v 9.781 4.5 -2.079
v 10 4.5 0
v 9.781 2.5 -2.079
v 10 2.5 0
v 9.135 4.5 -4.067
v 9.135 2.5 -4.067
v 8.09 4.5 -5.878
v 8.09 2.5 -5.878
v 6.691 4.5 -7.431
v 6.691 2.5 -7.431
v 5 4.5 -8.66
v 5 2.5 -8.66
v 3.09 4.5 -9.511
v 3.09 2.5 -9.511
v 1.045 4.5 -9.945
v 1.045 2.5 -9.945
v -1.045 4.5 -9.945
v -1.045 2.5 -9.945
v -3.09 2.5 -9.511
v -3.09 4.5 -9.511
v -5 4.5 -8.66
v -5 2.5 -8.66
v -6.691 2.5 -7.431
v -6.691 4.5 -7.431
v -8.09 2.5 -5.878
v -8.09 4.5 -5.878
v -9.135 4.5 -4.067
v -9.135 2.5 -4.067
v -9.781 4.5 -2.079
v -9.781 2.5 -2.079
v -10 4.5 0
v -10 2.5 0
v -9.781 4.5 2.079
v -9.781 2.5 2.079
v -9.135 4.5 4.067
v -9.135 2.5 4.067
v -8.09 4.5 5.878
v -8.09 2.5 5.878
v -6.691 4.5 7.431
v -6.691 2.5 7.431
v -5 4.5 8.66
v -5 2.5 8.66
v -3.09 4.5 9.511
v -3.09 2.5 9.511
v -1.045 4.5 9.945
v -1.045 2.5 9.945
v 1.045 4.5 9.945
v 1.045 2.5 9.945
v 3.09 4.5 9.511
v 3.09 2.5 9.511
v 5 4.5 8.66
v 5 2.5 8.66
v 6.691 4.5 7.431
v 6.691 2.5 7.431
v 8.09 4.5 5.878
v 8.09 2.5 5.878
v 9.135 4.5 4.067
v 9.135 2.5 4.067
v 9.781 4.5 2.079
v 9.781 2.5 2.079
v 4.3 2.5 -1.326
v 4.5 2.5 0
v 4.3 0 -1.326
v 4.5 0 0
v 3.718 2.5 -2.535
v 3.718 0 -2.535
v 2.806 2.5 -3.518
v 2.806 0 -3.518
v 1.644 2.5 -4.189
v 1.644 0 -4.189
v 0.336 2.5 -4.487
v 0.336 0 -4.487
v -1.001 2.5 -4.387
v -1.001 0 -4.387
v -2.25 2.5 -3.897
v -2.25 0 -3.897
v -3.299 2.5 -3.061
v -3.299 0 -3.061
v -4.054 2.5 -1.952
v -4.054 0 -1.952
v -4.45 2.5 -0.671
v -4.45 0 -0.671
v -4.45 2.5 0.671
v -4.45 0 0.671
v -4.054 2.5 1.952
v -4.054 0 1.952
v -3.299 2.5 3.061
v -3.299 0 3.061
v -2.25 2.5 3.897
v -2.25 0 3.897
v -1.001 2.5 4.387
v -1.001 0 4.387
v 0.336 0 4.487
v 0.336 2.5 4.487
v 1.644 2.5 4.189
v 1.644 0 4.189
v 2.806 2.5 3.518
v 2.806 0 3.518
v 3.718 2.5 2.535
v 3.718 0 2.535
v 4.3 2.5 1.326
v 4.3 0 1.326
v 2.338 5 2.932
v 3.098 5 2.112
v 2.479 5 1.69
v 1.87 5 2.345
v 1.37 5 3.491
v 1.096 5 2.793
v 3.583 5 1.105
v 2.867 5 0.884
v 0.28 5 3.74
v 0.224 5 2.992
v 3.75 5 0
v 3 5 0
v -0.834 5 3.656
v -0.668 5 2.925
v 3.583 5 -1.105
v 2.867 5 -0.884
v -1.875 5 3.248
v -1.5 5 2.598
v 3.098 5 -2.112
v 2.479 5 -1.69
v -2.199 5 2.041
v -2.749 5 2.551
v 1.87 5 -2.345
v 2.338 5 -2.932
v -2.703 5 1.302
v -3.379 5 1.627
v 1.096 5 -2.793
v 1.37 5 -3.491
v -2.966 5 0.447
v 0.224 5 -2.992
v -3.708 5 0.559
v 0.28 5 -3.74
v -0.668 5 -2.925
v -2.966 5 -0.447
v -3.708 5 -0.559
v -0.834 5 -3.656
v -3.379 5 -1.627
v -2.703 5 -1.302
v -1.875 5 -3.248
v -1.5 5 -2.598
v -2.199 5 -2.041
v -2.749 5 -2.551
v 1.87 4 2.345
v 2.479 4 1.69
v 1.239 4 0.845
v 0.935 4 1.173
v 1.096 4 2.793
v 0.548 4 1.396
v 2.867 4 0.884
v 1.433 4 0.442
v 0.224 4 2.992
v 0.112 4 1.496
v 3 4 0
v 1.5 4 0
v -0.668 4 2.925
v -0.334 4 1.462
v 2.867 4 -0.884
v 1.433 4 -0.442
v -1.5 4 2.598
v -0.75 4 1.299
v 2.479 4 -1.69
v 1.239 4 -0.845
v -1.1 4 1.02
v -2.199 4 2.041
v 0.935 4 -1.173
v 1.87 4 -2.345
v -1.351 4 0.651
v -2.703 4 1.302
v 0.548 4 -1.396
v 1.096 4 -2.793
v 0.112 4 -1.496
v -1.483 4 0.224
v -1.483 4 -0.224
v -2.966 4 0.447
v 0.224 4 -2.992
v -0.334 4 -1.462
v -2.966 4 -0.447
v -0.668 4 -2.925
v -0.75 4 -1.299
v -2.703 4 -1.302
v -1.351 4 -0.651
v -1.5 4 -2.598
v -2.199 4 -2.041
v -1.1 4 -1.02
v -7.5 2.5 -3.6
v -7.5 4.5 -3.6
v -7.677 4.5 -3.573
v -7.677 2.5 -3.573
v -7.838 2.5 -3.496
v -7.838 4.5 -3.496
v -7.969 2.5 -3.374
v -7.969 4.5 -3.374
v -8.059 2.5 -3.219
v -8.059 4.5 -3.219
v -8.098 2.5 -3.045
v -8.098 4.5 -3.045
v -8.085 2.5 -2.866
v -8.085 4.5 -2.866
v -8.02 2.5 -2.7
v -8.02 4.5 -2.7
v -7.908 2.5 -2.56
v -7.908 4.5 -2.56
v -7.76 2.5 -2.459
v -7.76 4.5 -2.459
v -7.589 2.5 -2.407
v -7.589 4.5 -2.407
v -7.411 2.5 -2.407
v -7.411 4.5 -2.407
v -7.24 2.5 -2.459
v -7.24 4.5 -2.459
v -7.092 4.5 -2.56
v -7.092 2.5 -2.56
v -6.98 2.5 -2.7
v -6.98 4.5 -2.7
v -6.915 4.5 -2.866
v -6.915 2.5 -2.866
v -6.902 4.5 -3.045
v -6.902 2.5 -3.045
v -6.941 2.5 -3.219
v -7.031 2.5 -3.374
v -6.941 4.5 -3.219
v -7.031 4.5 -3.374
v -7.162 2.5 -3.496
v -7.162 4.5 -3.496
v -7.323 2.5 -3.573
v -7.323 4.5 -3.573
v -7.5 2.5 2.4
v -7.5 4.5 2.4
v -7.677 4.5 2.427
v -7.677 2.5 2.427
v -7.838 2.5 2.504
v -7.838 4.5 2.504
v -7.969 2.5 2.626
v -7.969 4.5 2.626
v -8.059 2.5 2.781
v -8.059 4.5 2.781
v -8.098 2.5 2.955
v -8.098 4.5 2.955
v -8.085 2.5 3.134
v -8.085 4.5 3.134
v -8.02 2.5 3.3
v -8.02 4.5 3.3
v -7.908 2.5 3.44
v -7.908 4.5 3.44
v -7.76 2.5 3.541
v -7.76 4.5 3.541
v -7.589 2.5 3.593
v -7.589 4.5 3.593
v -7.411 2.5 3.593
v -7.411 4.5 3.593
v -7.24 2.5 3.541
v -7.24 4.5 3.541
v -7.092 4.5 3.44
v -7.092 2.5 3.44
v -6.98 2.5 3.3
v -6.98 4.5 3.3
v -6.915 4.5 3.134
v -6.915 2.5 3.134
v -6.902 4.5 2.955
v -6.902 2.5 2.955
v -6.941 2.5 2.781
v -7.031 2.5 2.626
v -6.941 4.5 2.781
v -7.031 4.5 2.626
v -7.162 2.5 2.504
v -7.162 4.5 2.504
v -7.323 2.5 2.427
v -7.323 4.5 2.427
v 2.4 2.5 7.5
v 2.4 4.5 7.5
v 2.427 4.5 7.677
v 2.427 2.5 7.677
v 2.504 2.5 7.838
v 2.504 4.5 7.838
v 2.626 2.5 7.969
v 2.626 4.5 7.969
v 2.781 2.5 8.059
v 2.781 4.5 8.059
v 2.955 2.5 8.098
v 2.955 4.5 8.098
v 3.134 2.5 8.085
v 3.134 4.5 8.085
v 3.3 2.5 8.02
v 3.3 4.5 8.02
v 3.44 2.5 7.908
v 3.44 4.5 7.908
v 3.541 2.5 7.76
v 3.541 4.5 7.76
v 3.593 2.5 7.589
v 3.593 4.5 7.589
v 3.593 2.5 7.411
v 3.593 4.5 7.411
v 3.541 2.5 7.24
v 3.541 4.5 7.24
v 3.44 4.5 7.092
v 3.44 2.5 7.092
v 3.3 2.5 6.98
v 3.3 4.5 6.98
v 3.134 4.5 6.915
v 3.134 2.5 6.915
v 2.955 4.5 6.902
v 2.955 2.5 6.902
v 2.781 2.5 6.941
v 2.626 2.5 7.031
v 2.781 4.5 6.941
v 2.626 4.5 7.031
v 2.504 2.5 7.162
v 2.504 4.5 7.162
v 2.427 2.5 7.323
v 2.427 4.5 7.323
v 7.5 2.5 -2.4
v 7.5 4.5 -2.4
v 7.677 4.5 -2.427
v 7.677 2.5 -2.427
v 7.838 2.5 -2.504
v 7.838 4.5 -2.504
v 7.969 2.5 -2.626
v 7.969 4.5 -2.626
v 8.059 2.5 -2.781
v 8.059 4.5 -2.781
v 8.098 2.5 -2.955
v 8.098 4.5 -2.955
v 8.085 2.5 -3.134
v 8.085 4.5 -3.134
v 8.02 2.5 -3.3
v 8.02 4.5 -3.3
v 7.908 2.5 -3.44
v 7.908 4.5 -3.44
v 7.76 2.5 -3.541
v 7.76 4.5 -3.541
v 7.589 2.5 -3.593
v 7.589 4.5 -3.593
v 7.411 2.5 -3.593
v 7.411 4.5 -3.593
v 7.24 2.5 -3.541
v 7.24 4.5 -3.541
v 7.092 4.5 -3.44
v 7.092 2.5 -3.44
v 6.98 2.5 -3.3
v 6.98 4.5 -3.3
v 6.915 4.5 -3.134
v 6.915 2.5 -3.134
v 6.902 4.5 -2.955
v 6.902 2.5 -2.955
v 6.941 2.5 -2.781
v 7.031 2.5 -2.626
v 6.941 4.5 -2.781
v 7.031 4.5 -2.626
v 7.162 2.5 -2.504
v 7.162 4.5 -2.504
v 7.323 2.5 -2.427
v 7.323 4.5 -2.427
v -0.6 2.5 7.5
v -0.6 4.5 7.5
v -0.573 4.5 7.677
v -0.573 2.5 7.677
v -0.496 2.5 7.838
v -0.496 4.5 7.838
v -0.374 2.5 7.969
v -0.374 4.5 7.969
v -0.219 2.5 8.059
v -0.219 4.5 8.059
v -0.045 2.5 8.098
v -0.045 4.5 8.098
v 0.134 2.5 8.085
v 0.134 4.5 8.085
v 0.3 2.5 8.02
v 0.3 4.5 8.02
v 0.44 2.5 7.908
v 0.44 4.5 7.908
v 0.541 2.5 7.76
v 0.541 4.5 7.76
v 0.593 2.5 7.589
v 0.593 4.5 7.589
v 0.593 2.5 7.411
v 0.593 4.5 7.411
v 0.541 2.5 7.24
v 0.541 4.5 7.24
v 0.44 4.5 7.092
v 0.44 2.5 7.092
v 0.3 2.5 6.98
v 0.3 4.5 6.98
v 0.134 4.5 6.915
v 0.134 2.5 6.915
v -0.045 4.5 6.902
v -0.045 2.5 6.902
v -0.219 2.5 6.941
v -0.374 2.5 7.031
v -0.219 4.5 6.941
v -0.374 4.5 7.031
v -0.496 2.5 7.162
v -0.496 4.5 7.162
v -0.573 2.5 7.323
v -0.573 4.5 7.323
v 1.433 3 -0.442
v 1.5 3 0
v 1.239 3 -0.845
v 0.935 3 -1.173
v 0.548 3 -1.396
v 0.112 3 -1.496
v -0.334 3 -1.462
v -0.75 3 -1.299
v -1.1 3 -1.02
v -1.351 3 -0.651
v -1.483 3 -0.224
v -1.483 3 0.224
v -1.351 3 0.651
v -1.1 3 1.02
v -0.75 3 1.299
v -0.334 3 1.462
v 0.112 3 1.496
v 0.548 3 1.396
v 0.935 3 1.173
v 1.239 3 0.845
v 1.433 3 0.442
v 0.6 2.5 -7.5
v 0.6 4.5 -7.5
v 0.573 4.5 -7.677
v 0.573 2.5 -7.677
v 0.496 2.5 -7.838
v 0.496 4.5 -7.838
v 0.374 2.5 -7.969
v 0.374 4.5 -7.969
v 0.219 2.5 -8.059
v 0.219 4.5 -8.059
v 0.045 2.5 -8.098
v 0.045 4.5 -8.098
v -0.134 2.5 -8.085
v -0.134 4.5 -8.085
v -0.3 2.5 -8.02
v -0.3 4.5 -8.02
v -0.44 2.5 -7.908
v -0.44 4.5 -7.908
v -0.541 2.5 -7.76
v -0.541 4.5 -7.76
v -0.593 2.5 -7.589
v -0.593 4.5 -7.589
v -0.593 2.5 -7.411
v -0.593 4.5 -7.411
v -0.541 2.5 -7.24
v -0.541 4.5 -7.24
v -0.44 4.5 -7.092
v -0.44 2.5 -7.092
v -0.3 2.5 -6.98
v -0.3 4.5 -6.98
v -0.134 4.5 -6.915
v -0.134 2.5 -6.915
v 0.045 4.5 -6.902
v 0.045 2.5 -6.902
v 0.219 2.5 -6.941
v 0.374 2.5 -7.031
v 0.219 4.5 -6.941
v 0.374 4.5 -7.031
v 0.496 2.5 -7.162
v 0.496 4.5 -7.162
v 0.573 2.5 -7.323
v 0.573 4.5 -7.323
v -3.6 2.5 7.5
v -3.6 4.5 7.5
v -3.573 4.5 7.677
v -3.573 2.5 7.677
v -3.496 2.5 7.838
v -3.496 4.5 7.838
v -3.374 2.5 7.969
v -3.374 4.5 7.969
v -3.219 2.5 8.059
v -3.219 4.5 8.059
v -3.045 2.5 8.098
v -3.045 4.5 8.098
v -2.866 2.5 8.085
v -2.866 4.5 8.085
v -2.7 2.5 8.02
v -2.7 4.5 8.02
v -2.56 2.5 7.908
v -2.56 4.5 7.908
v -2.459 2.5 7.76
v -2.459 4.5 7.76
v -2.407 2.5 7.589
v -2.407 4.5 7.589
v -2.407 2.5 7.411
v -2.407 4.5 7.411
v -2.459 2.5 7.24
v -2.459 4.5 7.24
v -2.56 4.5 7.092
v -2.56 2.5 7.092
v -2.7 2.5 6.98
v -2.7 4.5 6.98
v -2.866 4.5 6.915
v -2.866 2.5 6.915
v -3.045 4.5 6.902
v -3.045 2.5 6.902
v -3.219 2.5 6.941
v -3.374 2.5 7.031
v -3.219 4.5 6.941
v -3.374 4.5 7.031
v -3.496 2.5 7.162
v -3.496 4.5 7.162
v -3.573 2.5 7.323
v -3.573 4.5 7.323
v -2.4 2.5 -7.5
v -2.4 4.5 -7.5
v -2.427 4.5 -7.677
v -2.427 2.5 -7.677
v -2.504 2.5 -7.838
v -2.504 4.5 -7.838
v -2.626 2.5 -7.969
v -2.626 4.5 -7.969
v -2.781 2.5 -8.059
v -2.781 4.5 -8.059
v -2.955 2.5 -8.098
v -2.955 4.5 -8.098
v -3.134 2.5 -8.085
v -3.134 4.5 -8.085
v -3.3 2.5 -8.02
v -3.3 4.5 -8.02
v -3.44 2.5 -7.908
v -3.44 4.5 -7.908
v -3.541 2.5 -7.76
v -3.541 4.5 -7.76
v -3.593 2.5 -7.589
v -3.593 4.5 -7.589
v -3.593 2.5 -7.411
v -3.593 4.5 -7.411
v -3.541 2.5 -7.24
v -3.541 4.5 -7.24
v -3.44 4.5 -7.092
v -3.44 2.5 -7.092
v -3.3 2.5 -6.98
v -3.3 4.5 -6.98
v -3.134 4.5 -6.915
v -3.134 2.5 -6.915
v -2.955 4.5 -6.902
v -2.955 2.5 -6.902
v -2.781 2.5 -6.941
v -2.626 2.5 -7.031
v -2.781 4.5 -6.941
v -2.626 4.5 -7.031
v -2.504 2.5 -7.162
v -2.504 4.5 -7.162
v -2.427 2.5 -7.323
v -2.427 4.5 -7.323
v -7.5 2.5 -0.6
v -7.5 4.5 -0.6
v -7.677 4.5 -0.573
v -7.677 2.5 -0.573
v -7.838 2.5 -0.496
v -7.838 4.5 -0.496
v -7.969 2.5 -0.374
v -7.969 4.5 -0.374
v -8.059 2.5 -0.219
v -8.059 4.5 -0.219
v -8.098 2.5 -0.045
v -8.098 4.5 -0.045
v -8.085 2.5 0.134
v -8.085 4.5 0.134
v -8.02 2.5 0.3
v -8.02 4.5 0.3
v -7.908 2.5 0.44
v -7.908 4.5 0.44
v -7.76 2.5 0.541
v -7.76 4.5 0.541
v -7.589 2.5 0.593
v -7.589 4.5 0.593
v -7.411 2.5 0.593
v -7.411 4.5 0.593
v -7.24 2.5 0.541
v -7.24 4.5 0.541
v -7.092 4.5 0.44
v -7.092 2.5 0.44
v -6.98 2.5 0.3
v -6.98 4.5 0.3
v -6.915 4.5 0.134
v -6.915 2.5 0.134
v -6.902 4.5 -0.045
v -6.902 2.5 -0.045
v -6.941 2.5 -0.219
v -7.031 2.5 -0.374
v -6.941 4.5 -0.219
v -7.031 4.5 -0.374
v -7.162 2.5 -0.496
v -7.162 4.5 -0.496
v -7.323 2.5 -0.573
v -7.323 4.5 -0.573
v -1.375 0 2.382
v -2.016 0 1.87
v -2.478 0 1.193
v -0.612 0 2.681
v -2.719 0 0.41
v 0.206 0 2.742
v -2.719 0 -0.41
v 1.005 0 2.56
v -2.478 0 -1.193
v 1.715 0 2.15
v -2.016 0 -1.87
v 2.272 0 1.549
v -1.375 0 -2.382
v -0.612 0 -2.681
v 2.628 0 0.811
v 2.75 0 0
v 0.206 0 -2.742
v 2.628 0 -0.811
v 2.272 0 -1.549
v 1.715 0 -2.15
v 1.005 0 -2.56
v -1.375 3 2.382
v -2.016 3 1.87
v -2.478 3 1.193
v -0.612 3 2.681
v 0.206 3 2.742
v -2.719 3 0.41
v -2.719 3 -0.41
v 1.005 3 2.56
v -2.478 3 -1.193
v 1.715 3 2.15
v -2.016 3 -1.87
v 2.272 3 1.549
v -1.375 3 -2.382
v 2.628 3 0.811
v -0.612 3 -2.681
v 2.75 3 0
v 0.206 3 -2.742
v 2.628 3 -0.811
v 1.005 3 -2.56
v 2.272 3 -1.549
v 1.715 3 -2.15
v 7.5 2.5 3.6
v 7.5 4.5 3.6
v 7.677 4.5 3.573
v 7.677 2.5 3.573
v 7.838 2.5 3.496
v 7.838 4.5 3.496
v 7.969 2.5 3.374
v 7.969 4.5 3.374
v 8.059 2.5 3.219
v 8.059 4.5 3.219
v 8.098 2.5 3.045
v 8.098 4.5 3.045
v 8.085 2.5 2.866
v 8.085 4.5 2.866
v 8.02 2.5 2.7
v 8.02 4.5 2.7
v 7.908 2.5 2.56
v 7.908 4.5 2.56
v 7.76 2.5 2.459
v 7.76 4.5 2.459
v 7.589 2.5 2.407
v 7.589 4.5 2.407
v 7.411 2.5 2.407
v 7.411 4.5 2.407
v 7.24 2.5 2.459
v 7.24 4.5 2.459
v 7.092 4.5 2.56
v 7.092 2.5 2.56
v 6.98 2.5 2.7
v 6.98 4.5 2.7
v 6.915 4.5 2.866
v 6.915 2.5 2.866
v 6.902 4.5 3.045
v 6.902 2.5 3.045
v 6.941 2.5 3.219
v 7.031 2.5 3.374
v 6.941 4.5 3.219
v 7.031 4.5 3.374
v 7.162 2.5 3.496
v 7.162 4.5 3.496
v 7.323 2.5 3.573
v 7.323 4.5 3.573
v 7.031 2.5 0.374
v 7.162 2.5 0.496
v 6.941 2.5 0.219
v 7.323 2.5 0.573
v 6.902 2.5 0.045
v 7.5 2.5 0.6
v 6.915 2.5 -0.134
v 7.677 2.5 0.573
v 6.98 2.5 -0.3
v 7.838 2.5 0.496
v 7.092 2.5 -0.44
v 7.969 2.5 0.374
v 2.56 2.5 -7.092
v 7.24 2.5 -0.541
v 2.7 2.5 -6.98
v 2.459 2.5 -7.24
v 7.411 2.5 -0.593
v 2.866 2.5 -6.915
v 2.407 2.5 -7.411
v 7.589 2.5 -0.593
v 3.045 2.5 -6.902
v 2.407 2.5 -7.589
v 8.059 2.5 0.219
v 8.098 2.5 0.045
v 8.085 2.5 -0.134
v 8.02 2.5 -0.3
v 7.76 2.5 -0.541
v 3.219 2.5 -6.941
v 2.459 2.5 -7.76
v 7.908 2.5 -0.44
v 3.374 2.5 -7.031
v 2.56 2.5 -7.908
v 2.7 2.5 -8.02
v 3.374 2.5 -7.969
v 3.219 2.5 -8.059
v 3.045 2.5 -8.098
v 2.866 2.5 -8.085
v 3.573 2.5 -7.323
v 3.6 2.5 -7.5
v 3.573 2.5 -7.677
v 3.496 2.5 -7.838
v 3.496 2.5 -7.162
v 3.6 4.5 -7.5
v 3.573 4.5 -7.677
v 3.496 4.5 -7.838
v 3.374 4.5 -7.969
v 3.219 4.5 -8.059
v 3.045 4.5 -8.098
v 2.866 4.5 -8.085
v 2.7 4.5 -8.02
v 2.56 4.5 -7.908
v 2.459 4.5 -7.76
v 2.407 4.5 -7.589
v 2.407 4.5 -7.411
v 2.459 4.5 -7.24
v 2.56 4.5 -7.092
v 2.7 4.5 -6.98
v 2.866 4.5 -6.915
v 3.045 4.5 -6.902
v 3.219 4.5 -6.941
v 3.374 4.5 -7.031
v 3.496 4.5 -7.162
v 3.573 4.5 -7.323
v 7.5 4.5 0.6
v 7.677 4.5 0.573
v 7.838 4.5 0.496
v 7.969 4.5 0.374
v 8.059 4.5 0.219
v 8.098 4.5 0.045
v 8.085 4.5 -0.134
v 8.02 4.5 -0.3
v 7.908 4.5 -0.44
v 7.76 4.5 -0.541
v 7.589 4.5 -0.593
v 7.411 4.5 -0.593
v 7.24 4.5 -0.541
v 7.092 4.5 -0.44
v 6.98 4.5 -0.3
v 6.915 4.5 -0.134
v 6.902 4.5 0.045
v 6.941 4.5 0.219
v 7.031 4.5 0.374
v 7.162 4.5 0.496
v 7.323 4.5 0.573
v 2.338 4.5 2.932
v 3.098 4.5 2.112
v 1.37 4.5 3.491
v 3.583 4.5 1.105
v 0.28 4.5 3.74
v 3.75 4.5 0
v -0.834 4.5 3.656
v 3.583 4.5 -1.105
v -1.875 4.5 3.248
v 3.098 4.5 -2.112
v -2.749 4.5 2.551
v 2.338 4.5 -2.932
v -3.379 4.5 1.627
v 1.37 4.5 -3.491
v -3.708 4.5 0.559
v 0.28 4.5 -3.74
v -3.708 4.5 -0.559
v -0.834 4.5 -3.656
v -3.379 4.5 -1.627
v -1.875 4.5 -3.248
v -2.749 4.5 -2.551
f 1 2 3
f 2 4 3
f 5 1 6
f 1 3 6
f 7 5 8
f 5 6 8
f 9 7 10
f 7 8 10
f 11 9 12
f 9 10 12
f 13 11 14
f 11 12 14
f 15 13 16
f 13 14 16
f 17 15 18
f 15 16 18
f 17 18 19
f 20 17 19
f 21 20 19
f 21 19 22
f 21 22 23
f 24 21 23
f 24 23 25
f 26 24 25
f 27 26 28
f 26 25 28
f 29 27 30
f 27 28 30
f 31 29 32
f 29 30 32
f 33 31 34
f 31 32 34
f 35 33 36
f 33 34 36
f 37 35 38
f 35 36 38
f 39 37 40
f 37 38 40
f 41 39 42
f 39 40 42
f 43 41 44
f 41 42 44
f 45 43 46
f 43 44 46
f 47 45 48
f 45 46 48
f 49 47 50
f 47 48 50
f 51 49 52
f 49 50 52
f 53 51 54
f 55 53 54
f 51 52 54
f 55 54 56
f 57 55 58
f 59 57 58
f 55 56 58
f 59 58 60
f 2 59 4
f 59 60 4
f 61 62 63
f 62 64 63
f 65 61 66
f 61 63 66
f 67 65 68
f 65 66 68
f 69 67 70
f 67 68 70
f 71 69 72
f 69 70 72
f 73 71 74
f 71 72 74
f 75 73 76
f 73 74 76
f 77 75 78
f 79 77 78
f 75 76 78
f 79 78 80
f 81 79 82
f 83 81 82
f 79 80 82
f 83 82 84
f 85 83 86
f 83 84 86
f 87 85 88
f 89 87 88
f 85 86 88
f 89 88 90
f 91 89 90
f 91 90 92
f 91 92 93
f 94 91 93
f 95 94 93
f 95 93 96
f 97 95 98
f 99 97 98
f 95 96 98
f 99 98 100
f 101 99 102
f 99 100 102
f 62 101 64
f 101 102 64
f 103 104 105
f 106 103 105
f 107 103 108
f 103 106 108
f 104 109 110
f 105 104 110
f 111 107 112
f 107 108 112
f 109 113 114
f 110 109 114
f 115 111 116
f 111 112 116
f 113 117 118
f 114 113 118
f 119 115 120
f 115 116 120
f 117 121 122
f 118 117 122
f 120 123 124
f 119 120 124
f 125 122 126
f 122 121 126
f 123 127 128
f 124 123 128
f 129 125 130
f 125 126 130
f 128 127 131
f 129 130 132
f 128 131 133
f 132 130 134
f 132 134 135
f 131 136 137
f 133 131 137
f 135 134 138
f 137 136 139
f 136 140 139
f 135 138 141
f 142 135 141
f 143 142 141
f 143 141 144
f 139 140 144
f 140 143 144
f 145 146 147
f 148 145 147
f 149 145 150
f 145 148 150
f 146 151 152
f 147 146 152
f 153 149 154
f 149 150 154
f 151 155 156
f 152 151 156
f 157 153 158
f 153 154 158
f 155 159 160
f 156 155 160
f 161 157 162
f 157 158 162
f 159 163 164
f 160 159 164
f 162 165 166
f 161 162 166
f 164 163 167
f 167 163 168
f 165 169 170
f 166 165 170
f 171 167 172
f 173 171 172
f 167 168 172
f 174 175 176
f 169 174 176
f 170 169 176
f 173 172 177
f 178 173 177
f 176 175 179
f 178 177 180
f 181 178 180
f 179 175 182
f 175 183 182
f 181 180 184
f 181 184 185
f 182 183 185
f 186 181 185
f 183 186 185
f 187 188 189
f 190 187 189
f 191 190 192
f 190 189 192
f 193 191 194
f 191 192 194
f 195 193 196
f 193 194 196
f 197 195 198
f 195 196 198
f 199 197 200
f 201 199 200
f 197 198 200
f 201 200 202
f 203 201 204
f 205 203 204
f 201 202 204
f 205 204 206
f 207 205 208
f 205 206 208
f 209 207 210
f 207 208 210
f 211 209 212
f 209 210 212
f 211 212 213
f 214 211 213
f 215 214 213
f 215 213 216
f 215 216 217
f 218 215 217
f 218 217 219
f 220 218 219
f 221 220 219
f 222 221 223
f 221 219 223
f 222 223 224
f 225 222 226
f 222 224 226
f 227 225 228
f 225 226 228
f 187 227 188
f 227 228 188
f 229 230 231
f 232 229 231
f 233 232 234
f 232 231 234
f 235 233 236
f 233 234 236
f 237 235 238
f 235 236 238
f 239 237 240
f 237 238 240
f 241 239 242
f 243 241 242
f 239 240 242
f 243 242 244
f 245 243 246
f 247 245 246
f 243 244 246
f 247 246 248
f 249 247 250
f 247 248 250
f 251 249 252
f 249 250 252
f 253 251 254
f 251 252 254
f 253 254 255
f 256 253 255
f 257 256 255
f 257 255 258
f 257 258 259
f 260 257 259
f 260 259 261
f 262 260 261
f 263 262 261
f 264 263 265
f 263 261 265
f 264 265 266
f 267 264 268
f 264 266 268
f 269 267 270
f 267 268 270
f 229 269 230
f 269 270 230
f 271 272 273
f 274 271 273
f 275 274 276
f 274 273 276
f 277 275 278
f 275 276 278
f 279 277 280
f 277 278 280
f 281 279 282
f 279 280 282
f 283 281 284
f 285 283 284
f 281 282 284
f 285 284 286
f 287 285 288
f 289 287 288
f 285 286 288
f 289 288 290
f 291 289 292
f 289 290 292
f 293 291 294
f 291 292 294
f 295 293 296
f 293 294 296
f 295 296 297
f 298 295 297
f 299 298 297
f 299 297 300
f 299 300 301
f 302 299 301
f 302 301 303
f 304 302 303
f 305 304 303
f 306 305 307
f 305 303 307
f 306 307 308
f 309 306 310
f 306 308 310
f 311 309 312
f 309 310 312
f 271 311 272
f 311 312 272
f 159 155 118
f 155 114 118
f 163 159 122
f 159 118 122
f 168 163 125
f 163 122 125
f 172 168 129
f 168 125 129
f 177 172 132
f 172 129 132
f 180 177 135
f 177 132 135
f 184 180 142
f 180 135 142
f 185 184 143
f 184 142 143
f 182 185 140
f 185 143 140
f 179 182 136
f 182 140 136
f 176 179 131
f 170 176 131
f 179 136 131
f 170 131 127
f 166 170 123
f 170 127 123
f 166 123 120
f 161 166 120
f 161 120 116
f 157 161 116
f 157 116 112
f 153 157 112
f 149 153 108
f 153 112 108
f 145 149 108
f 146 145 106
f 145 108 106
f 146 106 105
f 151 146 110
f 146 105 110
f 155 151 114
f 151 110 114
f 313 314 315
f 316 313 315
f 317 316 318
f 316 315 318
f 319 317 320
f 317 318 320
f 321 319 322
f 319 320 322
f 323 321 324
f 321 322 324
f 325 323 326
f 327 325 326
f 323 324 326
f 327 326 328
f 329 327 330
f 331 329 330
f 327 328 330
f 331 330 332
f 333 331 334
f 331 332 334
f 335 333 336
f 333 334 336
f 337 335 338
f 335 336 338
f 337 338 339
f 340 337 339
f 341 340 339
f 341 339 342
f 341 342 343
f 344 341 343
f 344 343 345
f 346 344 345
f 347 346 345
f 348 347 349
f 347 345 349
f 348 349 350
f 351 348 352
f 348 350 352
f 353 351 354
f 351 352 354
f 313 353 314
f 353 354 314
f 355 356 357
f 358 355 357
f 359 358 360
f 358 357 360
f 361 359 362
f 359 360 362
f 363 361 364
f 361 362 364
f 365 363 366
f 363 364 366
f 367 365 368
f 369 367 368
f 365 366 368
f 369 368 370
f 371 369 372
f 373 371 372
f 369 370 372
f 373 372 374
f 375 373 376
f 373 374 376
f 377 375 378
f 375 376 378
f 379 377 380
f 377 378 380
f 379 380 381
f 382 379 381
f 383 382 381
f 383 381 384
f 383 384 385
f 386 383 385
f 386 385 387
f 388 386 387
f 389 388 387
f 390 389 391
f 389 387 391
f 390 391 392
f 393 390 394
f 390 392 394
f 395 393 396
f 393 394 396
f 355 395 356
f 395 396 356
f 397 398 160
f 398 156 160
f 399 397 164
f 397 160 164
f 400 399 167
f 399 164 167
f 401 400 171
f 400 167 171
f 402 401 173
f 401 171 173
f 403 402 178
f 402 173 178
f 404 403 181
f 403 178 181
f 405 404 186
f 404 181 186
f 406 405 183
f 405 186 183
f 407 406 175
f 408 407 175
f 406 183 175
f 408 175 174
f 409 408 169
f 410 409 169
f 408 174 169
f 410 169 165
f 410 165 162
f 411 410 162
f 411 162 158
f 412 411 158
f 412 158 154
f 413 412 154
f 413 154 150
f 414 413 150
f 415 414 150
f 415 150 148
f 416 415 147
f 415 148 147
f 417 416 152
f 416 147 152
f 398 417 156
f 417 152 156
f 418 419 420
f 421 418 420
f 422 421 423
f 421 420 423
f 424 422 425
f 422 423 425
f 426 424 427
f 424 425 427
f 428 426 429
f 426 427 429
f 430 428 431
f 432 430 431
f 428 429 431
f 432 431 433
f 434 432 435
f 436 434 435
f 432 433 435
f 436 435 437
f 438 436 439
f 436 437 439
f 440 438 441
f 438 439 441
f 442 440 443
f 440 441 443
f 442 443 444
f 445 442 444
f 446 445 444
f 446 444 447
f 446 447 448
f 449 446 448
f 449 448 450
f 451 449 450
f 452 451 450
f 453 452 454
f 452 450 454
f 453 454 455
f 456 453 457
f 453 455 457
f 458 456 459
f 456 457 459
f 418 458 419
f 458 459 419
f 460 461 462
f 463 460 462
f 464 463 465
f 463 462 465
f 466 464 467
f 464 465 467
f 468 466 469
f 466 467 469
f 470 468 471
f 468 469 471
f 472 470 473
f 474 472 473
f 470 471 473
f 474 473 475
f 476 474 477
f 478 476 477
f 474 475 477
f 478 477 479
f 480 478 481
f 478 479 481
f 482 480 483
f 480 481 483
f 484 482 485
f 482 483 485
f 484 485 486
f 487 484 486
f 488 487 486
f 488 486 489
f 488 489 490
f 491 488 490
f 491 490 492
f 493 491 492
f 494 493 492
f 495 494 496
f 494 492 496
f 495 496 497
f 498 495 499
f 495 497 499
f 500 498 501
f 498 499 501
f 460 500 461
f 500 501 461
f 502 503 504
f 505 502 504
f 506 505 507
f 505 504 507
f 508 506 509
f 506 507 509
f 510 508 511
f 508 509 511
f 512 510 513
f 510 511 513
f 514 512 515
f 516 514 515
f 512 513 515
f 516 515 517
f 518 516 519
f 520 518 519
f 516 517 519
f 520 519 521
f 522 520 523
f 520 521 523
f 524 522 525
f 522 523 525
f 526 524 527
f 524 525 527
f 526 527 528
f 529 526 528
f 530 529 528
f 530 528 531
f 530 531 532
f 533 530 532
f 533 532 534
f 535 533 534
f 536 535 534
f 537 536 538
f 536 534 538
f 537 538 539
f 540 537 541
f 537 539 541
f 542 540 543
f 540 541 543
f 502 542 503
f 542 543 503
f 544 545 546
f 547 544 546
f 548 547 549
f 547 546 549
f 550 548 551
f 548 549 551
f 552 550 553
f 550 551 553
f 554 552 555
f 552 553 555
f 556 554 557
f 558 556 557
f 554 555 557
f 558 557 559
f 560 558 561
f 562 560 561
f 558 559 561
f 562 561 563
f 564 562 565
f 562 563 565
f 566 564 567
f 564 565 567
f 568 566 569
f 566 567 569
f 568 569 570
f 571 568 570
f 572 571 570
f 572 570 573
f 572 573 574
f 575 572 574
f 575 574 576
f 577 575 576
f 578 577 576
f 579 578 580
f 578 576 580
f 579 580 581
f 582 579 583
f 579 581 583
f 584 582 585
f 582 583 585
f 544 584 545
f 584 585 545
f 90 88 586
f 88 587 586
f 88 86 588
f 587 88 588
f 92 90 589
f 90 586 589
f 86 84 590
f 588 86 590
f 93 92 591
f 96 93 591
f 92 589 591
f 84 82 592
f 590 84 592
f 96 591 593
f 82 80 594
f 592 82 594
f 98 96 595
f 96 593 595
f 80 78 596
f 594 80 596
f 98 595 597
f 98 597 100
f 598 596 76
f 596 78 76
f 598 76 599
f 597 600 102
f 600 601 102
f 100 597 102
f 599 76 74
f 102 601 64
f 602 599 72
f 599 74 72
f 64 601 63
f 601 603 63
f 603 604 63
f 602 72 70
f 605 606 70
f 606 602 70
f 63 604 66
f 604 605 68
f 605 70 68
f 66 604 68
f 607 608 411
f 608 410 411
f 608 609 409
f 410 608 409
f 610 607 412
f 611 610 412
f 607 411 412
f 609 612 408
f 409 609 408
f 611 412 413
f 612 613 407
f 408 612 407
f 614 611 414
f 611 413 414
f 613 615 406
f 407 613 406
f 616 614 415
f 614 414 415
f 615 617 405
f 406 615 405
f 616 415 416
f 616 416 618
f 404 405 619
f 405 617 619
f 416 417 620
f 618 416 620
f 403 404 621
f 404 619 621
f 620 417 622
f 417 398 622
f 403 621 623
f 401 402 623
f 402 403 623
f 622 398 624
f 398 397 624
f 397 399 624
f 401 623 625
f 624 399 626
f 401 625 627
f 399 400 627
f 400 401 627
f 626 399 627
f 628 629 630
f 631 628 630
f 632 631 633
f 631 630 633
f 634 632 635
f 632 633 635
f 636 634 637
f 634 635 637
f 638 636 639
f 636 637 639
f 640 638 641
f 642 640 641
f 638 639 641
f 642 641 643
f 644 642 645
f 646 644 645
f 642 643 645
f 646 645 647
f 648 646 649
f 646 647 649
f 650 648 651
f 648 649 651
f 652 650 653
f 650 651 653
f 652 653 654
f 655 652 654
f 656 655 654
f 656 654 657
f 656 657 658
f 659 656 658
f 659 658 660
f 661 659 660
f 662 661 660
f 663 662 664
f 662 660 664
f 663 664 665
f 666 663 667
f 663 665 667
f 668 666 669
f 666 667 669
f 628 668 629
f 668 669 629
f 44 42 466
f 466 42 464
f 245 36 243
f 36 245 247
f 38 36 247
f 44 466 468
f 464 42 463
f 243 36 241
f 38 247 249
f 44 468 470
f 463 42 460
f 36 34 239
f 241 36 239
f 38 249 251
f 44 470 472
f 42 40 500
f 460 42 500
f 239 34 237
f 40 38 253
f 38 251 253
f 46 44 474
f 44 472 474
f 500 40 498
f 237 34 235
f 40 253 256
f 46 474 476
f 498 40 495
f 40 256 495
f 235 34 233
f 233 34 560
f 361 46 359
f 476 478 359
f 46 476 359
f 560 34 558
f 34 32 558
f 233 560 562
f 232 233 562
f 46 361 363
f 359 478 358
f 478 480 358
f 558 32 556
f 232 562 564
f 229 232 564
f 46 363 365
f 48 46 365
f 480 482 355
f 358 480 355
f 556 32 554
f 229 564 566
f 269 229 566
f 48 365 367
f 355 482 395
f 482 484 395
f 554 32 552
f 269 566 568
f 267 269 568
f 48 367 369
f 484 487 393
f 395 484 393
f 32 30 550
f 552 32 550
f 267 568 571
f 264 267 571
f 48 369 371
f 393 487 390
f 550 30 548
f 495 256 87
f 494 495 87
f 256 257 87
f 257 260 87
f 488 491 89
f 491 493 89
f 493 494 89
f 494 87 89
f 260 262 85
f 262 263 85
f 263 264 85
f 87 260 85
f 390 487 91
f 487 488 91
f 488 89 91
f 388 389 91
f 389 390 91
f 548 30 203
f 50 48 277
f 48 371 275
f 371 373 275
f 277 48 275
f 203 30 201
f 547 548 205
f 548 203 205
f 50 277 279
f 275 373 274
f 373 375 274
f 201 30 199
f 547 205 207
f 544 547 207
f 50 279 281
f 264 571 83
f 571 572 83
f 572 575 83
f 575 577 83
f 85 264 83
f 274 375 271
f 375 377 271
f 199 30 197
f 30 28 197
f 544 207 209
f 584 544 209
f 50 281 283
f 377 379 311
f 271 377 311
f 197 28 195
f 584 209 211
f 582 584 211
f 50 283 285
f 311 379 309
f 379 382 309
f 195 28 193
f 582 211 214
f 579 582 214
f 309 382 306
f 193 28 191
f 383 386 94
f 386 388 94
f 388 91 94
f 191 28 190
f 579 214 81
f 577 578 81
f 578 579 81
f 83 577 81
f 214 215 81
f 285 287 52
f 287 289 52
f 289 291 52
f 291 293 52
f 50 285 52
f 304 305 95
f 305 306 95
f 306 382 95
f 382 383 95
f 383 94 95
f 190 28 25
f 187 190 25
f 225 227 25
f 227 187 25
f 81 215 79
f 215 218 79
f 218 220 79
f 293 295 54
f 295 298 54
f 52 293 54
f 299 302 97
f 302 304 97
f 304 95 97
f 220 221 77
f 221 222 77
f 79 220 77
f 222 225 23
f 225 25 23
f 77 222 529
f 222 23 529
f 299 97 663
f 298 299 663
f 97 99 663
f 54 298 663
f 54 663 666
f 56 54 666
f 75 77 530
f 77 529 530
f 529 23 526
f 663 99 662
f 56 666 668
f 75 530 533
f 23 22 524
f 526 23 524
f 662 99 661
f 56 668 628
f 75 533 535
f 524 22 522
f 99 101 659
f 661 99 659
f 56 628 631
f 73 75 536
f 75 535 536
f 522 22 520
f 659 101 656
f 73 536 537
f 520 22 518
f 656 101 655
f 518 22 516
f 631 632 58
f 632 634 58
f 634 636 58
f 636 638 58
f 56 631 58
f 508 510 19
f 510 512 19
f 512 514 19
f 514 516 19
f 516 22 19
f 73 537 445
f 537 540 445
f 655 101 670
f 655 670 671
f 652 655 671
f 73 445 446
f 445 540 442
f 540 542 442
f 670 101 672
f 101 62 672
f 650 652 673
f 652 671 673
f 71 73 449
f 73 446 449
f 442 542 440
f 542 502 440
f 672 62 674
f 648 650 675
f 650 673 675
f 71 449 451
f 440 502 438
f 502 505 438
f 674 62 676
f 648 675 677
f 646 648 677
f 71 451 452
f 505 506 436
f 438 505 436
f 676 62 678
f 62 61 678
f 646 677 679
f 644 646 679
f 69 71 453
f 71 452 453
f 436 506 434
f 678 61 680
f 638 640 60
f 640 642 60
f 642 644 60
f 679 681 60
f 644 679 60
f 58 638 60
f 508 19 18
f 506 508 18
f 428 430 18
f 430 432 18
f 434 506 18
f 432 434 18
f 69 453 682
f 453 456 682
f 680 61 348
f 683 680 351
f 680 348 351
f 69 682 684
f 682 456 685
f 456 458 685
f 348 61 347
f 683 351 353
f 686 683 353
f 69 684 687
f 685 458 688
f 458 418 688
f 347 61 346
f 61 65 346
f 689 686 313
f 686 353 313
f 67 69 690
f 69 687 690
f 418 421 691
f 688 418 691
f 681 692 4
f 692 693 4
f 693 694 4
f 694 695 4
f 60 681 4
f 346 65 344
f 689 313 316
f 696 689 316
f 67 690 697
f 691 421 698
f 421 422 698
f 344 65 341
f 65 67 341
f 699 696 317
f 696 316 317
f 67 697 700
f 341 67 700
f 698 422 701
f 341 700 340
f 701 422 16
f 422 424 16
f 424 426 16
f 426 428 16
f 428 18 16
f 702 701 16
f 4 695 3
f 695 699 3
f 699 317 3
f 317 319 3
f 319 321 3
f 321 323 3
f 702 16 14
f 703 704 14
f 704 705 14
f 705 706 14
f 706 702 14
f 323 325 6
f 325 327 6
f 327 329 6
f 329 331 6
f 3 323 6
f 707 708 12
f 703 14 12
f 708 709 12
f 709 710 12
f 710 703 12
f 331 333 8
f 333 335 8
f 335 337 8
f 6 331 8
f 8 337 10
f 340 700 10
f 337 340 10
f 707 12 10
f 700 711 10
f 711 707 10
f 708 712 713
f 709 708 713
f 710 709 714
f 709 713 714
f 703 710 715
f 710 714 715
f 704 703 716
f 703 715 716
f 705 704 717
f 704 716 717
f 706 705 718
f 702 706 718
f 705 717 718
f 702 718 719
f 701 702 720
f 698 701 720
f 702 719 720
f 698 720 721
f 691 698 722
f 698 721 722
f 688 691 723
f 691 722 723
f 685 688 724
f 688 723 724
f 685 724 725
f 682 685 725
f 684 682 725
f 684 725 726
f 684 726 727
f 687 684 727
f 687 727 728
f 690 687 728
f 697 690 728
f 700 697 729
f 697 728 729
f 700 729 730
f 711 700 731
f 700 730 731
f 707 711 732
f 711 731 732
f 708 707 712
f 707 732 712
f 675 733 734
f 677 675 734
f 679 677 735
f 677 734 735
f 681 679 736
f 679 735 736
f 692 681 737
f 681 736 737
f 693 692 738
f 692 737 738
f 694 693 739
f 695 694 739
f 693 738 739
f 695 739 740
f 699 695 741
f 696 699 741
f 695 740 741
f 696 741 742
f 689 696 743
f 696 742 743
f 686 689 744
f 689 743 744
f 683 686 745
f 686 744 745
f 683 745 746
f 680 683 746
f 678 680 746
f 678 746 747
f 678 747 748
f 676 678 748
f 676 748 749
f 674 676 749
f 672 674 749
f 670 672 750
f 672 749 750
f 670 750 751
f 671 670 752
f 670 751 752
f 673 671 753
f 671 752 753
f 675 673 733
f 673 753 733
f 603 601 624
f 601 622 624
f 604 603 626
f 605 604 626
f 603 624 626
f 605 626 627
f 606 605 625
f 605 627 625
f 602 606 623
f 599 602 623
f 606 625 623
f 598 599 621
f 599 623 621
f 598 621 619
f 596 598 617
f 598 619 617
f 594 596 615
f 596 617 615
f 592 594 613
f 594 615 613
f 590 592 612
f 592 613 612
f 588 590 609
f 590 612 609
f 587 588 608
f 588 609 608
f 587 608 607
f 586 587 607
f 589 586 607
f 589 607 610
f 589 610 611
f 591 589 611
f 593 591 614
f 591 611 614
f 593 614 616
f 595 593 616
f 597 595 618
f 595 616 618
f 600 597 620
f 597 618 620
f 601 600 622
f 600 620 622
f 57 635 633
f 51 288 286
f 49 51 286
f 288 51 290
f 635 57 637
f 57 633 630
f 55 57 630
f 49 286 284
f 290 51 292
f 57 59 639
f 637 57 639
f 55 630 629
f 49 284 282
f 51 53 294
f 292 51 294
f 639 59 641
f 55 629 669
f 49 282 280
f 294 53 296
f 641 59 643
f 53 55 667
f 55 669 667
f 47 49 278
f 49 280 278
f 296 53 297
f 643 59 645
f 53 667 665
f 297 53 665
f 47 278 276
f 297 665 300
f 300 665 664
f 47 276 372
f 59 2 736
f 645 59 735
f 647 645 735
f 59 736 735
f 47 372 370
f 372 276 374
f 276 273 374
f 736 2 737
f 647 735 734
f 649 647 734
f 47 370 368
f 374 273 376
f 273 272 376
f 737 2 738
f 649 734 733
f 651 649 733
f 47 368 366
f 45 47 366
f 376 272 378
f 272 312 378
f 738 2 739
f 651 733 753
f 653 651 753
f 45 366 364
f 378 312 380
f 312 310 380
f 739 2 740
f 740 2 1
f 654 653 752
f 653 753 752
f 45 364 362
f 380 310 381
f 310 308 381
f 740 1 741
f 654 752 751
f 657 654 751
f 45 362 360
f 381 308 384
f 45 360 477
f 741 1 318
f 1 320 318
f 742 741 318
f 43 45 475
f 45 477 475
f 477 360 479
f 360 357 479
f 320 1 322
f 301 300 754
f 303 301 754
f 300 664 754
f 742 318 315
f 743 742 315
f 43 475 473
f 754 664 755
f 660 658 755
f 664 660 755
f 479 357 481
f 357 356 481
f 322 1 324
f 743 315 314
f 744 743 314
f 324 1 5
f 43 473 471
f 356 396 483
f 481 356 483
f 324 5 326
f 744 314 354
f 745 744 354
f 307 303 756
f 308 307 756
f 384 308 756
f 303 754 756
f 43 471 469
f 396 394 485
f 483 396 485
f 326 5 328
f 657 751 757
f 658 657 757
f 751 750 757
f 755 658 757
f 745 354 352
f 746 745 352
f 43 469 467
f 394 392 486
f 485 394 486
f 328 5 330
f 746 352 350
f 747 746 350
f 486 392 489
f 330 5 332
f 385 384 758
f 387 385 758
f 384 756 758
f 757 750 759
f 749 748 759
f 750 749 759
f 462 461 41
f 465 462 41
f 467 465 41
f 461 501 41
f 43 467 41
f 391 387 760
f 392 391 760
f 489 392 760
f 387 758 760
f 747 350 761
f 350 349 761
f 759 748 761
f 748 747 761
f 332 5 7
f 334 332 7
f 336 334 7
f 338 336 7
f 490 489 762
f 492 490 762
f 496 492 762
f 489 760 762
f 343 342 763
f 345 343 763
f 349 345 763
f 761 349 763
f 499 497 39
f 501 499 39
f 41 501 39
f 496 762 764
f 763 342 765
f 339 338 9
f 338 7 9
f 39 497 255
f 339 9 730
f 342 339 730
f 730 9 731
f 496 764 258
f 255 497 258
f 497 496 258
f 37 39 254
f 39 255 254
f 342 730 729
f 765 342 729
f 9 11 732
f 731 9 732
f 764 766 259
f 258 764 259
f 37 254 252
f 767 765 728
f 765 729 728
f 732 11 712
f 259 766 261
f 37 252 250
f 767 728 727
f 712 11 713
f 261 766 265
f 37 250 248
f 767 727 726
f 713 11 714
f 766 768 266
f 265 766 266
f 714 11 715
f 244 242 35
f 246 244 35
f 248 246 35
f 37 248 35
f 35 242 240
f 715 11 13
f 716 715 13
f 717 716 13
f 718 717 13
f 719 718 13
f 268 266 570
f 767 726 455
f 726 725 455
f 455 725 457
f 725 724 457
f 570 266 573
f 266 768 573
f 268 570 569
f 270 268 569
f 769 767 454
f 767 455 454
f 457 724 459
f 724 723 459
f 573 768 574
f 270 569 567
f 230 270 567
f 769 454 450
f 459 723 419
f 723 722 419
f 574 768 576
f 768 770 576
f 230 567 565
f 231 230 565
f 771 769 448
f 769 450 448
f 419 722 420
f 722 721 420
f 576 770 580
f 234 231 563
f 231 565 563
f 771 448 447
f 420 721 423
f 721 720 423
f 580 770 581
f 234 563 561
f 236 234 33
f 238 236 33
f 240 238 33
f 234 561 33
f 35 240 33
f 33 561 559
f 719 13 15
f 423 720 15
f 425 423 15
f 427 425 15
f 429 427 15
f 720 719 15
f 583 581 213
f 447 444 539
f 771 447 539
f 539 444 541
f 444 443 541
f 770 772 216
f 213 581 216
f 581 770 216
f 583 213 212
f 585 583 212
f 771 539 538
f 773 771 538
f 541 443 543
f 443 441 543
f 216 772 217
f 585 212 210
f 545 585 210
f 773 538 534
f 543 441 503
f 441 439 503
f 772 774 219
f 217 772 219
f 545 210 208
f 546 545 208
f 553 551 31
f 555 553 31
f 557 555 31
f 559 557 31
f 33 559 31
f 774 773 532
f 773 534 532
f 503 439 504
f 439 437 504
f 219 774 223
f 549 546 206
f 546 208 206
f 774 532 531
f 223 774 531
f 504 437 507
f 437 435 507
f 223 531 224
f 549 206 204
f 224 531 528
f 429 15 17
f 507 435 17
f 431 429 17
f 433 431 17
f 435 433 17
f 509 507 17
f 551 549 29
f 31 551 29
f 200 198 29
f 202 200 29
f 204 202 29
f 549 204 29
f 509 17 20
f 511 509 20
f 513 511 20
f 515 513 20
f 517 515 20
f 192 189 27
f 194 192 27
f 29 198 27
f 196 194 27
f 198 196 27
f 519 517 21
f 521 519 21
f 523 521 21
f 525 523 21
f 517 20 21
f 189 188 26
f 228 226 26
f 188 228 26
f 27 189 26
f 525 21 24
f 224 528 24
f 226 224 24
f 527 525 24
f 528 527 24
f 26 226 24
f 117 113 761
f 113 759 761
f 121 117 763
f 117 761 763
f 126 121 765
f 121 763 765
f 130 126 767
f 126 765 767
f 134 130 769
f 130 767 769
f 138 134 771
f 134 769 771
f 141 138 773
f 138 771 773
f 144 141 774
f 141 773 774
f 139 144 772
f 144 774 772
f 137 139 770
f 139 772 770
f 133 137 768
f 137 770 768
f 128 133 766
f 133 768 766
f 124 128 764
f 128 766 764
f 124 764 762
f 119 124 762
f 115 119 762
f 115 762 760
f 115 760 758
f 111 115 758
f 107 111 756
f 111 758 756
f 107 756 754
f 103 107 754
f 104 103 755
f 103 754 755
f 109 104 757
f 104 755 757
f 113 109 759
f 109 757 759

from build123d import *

# Parameters (mm, degrees)
SKETCH1_R          = 0.6
CUT_EXTRUDE1_DEPTH = 2
CIRPATTERN1_COUNT  = 4


with BuildPart() as part:
    # Esquisse1 → Révolution1 (revolve)
    with BuildSketch(Plane.XY):
        Polygon((2.75, 0), (2.75, 3), (1.5, 3), (1.5, 4), (3, 4), (3, 5), (3.75, 5), (3.75, 4.5), (10, 4.5), (10, 2.5), (4.5, 2.5), (4.5, 0), align=None)
    revolve(axis=Axis((0, 0, 0), (0, 1, 0)))

    # Sketch1 → Cut-Extrude1 (cut)
    with BuildSketch(Plane(origin=(0, 4.5, 0), x_dir=(1, 0, 0), z_dir=(0, 1, 0))):
        with Locations((0, 7.5)):
            Circle(SKETCH1_R)
        with Locations((3, 7.5)):
            Circle(SKETCH1_R)
        with Locations((-3, 7.5)):
            Circle(SKETCH1_R)
    cut_extrude1 = extrude(amount=-CUT_EXTRUDE1_DEPTH, mode=Mode.SUBTRACT)

    # CirPattern1: Cut-Extrude1 ×4 about axis
    cirpattern1_axis = Axis((0, 0, 0), (0, 1, 0))
    for i in range(1, CIRPATTERN1_COUNT):
        add(cut_extrude1.rotate(cirpattern1_axis, i * 360 / CIRPATTERN1_COUNT), mode=Mode.SUBTRACT)


solid = part.part
